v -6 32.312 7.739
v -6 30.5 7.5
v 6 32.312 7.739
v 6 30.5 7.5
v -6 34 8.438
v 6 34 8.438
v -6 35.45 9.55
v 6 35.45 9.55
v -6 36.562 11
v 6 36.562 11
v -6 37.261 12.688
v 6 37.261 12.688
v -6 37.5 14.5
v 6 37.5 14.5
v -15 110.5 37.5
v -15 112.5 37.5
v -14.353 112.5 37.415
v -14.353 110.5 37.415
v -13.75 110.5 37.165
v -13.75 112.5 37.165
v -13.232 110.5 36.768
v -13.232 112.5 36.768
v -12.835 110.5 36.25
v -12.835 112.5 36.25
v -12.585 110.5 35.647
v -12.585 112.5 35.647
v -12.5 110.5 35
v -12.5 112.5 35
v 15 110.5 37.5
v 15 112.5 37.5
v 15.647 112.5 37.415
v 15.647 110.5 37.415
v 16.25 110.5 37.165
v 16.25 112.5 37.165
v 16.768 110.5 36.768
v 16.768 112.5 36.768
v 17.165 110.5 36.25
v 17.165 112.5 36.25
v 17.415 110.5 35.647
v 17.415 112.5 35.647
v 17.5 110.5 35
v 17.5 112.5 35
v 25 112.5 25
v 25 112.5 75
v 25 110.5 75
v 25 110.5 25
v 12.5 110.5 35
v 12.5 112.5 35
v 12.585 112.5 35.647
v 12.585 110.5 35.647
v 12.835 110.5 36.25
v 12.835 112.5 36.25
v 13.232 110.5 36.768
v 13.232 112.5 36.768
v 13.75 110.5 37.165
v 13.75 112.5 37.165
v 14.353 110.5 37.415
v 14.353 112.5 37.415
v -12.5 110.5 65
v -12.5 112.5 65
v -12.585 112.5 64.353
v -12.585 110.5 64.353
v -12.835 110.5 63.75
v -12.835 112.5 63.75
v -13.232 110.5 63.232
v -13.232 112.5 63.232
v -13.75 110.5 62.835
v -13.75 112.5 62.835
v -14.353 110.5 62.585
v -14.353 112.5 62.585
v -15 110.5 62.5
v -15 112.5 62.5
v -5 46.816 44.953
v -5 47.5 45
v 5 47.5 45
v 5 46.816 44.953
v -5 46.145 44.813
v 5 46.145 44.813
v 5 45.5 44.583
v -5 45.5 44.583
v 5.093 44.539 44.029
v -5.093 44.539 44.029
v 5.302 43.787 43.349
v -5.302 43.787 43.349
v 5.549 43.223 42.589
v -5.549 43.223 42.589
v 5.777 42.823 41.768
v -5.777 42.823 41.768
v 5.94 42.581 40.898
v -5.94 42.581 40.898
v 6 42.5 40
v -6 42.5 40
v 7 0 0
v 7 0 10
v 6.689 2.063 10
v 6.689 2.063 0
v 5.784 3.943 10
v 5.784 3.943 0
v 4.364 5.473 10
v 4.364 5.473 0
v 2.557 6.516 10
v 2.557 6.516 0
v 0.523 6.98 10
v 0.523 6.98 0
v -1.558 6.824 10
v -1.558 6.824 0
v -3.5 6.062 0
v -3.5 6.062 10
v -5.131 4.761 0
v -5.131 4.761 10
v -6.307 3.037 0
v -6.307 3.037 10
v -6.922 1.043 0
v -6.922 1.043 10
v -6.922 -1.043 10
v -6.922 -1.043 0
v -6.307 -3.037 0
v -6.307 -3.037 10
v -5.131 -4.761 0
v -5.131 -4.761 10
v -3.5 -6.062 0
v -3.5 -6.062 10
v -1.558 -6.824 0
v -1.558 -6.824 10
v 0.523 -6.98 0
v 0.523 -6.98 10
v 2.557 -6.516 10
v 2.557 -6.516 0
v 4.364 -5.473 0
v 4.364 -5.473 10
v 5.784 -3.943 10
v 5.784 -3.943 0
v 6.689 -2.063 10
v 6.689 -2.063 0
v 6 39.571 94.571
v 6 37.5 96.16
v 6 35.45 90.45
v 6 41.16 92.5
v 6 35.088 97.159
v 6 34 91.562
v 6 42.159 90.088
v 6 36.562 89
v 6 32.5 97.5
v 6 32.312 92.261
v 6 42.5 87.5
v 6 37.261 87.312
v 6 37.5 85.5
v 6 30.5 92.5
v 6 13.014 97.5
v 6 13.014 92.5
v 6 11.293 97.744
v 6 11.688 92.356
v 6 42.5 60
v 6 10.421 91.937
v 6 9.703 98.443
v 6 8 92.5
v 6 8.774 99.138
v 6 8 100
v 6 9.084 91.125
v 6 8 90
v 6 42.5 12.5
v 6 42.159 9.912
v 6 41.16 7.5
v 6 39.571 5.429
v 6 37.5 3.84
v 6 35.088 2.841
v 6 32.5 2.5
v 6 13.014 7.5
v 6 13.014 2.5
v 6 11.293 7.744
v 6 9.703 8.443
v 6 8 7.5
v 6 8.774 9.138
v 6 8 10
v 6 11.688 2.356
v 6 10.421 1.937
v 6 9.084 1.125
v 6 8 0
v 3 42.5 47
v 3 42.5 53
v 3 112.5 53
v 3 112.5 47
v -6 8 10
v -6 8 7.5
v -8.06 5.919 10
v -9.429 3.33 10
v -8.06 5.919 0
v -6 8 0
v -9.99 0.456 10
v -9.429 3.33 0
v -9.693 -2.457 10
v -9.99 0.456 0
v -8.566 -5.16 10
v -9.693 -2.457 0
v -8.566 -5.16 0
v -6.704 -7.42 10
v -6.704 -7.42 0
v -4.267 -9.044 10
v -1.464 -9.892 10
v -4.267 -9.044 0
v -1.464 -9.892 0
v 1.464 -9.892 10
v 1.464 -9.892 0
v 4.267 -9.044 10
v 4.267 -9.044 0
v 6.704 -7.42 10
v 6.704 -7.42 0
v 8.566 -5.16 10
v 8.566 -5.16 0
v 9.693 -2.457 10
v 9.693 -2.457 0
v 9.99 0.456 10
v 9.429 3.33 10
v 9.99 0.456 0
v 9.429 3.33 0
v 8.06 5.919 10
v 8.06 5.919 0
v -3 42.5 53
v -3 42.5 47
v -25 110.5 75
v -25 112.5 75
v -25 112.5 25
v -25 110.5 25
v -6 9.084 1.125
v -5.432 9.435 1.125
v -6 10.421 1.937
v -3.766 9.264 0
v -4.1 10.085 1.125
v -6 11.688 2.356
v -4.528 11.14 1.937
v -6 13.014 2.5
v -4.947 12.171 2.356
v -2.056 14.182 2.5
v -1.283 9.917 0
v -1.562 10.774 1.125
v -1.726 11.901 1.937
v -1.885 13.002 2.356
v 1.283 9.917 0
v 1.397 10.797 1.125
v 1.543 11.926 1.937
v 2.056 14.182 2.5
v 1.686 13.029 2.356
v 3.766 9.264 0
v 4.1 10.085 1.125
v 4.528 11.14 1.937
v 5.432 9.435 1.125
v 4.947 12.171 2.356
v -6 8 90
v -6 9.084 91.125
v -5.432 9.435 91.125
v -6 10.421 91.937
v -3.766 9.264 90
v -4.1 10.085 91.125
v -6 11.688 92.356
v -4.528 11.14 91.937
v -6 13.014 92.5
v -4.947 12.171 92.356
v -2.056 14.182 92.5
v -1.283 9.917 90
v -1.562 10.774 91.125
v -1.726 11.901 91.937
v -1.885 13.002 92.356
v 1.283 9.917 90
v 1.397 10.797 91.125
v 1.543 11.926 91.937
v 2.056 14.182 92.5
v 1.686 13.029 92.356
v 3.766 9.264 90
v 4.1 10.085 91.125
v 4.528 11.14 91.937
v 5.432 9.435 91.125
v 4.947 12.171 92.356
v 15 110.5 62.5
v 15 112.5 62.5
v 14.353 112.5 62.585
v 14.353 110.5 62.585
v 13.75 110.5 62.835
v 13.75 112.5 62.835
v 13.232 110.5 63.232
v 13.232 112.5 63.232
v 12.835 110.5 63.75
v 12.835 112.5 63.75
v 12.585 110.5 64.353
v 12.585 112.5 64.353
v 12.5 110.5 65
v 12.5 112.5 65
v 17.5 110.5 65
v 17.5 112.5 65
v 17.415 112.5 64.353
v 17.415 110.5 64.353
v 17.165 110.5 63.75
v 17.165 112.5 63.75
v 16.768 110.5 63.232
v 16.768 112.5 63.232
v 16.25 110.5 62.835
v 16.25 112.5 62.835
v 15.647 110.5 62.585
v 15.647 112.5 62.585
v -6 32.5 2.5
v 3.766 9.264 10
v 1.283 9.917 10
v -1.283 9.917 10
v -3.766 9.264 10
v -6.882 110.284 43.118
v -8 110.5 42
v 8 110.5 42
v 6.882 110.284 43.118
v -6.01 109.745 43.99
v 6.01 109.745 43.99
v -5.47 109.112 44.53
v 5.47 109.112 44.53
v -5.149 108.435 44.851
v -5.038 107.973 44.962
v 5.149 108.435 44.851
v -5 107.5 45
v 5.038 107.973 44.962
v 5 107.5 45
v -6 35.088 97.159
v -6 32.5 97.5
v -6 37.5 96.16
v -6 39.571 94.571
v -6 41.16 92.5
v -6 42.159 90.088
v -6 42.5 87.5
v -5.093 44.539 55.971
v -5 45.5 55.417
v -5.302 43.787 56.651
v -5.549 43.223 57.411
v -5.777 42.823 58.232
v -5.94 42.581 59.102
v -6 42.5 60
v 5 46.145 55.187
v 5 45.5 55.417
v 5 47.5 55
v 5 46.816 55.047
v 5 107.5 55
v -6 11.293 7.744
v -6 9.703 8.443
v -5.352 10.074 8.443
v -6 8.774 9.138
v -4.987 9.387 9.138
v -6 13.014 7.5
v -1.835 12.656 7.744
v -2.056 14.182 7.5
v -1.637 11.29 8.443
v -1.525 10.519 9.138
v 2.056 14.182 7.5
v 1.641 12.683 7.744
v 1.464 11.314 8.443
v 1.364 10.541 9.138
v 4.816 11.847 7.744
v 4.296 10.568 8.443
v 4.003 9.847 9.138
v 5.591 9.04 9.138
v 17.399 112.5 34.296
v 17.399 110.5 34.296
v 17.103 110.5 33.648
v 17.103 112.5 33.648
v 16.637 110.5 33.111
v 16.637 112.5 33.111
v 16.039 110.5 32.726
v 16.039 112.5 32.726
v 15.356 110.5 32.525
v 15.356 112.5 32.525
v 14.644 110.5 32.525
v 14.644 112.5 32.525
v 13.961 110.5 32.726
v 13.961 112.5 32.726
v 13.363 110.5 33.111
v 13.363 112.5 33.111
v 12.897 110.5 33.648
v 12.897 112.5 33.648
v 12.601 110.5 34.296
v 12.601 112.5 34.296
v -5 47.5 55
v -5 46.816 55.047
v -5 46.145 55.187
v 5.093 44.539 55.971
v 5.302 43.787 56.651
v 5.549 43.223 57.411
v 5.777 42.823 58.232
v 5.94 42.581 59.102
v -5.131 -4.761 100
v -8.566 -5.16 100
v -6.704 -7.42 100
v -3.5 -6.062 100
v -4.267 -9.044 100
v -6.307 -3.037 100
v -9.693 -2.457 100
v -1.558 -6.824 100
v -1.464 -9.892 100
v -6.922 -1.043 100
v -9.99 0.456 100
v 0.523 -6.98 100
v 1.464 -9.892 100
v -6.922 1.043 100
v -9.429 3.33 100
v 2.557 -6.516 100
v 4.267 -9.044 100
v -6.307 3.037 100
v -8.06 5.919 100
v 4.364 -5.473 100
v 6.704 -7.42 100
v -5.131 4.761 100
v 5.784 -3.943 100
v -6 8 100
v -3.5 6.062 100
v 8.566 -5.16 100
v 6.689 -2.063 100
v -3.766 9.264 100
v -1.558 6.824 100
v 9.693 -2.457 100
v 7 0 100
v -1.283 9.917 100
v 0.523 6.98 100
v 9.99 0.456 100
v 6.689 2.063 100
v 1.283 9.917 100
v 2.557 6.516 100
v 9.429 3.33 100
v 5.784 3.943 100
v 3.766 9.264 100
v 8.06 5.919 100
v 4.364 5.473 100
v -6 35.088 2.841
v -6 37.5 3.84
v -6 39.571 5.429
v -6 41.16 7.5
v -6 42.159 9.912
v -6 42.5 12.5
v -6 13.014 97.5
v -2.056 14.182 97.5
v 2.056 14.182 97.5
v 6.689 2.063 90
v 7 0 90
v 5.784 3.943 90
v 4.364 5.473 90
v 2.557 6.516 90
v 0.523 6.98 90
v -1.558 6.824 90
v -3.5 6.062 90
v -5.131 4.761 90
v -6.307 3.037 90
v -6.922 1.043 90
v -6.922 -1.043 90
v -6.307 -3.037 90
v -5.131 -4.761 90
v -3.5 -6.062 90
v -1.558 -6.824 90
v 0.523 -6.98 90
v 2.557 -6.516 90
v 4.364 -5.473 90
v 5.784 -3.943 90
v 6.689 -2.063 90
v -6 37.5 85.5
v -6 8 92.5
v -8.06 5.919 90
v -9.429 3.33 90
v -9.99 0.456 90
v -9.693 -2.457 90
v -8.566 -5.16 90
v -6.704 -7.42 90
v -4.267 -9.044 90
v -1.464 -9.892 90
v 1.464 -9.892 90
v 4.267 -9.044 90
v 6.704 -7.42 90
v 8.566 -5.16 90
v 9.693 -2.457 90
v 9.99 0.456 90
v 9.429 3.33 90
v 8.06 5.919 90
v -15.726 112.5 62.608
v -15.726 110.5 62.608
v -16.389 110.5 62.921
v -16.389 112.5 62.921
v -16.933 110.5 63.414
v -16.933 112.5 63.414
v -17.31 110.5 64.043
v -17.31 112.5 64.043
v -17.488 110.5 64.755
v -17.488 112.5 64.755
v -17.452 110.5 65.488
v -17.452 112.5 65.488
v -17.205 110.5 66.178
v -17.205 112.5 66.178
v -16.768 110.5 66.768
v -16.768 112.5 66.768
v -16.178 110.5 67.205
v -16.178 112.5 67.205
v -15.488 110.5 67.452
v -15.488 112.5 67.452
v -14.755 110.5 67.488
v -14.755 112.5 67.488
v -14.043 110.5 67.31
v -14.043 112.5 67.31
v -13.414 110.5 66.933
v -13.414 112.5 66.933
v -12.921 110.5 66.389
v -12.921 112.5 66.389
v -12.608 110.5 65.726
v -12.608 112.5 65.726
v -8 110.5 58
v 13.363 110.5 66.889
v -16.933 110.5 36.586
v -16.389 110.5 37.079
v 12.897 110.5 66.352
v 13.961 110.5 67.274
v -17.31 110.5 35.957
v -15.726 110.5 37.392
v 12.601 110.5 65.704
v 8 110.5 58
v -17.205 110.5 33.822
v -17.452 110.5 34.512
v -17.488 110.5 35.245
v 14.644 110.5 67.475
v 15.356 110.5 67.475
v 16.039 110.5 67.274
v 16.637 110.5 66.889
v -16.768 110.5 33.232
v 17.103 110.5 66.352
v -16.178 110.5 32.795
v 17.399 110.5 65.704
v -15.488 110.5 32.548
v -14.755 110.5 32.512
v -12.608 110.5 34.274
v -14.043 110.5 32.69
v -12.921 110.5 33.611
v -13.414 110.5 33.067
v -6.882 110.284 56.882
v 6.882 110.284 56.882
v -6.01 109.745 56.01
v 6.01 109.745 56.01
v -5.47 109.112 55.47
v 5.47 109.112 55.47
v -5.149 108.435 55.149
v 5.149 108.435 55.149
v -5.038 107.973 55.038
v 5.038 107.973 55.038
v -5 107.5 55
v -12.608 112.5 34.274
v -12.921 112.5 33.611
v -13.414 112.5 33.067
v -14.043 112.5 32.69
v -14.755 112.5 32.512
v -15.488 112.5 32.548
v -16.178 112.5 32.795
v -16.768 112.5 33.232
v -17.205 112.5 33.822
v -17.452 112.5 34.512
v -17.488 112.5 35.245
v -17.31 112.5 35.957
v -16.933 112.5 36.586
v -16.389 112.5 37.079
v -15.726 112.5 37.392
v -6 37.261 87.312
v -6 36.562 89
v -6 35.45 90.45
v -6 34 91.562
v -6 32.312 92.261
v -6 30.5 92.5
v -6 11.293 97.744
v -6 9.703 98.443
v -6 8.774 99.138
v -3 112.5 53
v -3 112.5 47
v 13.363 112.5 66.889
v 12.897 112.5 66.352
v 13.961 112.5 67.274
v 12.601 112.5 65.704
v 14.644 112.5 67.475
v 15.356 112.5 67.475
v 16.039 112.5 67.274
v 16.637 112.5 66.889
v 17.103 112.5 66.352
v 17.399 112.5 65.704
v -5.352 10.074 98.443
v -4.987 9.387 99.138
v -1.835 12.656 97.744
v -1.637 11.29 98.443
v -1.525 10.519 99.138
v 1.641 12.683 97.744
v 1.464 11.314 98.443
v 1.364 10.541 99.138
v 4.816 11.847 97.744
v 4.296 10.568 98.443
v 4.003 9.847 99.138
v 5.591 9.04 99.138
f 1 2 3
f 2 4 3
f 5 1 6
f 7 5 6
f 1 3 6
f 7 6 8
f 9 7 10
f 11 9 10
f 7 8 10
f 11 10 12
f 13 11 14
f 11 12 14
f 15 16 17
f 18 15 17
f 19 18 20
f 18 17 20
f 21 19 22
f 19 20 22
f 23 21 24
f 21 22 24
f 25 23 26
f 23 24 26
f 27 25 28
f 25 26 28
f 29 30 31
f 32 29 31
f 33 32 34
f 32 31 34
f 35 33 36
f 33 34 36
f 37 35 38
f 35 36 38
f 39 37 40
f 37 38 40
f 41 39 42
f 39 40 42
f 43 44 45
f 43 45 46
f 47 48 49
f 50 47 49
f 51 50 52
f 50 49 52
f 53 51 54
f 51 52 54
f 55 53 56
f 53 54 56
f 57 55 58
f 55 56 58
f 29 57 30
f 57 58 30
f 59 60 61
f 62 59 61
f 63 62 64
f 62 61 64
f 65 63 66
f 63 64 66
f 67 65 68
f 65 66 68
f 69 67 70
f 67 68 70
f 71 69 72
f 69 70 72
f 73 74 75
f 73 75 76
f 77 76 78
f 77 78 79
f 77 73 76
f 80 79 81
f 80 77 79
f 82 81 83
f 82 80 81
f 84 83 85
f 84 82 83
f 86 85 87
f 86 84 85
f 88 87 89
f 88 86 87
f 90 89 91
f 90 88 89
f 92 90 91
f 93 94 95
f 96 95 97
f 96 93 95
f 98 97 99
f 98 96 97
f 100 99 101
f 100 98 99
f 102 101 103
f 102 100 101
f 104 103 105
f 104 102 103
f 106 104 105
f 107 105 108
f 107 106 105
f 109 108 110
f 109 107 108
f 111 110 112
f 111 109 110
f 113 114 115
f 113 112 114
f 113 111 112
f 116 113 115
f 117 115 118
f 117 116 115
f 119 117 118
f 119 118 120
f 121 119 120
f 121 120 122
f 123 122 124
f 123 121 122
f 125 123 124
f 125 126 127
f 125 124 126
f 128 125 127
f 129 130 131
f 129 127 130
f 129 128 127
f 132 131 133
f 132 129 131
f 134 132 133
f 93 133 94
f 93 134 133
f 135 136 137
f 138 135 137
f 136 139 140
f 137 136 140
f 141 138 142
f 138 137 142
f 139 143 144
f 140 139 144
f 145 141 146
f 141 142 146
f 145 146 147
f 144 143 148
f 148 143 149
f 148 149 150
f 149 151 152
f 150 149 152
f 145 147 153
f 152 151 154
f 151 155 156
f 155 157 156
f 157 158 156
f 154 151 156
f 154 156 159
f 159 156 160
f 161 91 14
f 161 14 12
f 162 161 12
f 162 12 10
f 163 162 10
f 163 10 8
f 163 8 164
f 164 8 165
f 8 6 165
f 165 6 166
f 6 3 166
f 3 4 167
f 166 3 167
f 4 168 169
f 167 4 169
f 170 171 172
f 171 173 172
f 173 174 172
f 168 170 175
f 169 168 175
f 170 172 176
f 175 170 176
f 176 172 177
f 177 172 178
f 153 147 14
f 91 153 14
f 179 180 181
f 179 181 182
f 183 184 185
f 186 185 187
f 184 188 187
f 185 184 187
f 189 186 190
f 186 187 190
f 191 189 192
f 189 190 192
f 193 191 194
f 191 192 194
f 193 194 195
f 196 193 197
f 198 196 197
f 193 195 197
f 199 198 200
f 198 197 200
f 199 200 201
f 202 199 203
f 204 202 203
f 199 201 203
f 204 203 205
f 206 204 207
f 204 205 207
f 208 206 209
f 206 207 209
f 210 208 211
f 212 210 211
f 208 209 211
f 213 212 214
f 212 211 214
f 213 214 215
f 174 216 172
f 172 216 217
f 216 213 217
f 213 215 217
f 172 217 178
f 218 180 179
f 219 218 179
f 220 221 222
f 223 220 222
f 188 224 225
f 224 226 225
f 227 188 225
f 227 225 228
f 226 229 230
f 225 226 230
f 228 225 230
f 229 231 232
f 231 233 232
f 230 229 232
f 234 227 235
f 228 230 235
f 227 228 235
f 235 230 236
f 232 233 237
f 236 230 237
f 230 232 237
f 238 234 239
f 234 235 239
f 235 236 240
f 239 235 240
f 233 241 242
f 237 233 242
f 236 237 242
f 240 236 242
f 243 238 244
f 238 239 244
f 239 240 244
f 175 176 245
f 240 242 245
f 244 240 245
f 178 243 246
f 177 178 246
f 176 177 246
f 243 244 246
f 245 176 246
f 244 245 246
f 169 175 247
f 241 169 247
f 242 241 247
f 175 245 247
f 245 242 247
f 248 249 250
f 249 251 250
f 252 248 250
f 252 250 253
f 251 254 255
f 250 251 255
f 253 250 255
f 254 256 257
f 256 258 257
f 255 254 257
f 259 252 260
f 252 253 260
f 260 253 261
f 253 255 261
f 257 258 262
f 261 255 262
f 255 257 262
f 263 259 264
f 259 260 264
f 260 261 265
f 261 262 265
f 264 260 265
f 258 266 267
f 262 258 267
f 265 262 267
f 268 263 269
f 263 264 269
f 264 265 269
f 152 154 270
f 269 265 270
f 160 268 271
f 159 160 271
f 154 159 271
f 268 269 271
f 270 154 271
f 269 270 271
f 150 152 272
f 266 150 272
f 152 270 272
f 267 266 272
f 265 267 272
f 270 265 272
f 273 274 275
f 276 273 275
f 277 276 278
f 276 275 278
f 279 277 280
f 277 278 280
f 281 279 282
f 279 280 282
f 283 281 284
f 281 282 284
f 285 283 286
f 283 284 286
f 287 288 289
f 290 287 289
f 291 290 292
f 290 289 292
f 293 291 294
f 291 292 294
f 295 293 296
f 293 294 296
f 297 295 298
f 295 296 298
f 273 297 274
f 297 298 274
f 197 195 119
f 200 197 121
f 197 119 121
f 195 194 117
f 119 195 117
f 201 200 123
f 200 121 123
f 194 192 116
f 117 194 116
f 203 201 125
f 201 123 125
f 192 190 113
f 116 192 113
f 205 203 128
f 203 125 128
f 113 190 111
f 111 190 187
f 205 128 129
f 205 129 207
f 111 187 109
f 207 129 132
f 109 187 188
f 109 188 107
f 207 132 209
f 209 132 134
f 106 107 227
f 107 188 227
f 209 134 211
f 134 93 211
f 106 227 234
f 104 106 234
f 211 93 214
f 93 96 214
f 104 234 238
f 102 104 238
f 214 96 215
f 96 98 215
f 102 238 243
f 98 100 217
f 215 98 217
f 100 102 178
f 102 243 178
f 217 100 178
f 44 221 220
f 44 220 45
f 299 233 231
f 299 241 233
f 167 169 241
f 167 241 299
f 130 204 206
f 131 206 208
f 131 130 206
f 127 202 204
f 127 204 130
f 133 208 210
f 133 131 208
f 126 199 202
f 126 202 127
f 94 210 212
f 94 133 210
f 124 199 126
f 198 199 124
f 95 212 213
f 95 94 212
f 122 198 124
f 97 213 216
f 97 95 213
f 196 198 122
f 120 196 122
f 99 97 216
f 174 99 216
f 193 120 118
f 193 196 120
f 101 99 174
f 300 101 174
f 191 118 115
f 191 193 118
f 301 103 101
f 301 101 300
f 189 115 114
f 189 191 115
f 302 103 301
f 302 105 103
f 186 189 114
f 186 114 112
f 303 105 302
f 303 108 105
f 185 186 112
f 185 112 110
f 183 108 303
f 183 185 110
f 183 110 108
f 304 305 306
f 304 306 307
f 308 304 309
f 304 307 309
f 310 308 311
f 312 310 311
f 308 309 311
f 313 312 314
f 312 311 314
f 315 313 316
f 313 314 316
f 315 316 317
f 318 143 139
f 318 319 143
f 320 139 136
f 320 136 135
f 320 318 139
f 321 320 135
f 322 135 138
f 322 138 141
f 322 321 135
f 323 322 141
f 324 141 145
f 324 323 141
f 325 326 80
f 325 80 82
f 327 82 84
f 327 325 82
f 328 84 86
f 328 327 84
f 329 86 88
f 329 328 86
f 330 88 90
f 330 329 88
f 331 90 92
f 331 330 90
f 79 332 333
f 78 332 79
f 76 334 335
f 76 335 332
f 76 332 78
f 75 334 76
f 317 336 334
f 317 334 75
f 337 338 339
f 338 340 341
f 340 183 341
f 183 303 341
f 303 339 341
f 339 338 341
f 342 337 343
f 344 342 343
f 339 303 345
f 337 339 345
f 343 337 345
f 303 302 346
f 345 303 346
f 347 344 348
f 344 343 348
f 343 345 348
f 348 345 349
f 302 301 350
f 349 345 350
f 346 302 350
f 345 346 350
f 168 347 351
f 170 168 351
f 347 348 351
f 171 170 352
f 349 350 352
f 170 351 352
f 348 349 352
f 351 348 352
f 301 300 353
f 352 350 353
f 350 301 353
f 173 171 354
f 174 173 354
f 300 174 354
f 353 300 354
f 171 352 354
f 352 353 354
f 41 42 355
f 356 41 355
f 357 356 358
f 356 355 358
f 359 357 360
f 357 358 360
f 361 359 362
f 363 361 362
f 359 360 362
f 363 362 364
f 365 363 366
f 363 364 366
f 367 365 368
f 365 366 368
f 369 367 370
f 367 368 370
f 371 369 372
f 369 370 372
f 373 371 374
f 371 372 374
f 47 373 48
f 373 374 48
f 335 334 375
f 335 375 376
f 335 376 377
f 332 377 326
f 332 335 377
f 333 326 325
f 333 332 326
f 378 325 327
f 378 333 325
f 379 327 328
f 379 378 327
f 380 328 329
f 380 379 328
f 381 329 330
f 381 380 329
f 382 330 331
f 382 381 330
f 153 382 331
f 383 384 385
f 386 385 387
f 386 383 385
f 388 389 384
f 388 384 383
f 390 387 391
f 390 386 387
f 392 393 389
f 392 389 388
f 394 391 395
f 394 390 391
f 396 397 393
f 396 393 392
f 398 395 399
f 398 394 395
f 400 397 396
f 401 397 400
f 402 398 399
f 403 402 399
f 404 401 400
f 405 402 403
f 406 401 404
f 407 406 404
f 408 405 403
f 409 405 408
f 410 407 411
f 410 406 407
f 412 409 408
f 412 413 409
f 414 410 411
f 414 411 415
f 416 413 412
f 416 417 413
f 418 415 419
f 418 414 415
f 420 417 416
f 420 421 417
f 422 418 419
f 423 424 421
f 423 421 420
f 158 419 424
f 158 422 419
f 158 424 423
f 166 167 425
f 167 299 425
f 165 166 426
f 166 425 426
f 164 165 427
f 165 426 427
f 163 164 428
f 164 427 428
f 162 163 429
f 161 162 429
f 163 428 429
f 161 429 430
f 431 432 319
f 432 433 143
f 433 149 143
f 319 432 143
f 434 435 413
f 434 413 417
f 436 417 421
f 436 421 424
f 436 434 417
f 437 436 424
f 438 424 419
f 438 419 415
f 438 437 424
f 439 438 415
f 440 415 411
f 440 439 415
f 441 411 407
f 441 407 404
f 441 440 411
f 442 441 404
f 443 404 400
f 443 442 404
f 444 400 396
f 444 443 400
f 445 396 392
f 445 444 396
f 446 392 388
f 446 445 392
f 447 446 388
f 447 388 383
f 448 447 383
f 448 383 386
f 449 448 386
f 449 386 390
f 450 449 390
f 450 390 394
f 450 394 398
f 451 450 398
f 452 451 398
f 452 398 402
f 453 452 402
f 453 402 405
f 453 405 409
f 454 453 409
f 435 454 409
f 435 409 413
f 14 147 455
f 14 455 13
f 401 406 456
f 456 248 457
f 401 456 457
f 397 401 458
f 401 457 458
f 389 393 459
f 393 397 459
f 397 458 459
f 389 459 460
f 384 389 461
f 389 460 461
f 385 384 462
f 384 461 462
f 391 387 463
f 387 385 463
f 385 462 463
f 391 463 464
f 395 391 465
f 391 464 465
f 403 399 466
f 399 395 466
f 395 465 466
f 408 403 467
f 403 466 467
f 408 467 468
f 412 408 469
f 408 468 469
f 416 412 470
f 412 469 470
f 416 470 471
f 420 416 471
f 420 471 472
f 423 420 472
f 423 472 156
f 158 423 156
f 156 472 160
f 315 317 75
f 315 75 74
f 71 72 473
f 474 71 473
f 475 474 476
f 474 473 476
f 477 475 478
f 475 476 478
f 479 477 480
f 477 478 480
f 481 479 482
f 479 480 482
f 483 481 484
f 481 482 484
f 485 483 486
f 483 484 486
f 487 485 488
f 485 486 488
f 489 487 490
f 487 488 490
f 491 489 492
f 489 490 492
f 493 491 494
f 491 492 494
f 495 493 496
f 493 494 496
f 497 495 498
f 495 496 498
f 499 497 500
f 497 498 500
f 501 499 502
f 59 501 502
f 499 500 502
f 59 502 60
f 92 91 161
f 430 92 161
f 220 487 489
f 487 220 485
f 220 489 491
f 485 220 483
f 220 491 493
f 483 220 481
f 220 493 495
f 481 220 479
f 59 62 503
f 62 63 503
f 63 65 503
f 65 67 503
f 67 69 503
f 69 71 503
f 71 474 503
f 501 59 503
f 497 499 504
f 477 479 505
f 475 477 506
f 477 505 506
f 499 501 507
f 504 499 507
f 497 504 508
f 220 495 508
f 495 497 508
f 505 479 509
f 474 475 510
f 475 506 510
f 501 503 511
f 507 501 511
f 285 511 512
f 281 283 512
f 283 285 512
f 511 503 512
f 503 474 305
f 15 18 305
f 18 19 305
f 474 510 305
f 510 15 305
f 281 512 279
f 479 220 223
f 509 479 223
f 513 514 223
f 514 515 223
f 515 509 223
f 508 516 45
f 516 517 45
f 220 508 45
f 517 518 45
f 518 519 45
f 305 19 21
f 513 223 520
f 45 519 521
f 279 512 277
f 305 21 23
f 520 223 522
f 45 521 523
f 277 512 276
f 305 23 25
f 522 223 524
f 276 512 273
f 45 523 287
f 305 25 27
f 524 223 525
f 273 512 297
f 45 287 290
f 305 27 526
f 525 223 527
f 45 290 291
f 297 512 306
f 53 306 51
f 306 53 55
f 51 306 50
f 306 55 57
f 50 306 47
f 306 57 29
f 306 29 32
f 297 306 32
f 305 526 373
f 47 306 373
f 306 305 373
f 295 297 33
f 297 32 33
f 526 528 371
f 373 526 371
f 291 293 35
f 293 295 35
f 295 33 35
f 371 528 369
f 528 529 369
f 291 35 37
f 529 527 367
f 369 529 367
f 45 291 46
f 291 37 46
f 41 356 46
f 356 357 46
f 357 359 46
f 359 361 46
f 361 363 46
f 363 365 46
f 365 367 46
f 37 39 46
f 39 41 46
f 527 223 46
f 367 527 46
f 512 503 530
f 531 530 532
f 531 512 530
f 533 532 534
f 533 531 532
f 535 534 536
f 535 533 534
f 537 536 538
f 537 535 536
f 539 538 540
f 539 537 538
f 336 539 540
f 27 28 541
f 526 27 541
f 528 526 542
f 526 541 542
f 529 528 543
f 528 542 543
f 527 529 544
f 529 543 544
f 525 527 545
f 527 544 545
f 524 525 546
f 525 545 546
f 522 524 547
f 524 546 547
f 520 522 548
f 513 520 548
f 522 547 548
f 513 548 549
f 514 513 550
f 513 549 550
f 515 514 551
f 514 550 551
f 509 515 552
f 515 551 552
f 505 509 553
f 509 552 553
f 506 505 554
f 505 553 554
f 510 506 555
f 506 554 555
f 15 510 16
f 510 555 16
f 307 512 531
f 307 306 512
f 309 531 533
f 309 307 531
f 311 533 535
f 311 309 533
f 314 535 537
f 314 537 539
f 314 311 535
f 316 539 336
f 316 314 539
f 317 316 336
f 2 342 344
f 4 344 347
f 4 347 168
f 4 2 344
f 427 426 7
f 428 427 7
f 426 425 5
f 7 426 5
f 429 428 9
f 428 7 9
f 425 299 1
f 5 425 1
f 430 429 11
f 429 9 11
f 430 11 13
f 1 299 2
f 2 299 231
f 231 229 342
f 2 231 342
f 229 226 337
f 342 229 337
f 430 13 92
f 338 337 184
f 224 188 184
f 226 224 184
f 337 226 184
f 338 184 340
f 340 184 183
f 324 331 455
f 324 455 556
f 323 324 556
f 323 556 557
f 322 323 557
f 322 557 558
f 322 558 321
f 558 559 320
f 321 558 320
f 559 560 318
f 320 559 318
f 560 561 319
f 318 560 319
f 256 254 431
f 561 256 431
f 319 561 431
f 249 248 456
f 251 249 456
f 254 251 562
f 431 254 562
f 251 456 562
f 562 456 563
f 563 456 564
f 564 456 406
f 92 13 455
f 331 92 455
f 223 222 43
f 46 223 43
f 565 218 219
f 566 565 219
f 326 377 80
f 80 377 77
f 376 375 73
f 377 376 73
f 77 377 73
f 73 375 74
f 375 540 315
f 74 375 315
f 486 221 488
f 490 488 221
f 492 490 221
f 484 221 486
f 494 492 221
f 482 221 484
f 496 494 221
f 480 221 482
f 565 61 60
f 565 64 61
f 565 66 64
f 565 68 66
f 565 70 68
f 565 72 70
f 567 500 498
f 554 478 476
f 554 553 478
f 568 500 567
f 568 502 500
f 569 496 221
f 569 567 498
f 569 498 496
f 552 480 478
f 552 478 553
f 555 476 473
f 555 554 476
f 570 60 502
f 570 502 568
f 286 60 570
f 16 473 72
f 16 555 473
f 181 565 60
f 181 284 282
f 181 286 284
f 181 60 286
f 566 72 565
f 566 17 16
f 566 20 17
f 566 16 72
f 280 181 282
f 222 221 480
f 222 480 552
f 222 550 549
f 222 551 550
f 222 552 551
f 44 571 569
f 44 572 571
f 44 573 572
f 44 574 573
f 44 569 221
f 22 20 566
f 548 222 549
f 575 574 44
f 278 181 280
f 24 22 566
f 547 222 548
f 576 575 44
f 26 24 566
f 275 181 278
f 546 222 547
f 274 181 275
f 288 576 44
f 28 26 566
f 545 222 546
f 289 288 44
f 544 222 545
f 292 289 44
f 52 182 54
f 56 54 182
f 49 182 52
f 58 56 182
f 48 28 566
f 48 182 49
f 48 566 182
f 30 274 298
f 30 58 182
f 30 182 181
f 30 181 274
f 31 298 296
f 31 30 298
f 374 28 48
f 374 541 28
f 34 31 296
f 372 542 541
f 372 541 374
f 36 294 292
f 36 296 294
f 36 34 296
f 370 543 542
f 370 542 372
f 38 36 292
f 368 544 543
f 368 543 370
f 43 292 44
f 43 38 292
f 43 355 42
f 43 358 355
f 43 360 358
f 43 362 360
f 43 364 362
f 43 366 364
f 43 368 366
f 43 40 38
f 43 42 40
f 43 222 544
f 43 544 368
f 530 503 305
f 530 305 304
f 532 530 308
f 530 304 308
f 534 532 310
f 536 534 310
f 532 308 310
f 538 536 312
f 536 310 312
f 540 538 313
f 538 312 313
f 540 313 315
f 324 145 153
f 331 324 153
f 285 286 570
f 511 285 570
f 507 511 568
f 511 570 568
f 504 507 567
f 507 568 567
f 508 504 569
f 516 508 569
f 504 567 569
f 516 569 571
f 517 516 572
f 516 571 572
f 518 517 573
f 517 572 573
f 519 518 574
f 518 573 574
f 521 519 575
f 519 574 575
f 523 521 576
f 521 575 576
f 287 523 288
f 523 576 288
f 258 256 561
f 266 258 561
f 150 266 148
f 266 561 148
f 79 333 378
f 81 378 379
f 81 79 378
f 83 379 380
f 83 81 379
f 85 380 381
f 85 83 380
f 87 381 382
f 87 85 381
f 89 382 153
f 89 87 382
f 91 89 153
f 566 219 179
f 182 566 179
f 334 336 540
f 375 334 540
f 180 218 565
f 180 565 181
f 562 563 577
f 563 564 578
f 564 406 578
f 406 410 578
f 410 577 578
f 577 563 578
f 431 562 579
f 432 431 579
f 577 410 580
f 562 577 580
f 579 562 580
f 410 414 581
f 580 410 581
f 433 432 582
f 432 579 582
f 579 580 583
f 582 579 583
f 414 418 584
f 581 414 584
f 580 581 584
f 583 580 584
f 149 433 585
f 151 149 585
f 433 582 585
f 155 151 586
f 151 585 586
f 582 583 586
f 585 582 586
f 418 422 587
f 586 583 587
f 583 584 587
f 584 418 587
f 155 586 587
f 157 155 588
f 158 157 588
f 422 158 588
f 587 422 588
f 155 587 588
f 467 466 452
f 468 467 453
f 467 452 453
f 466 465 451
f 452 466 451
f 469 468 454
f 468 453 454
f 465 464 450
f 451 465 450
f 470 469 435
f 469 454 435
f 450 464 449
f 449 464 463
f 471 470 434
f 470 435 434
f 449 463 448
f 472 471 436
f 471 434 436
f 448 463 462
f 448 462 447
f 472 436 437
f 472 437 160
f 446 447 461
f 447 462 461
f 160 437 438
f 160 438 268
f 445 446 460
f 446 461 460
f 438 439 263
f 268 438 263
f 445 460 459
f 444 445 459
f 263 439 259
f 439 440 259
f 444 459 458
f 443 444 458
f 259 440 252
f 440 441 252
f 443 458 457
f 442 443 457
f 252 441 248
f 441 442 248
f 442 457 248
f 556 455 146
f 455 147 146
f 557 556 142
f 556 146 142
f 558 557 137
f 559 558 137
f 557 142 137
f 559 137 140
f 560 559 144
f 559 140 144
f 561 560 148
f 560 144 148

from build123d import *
from OCP.BRepFilletAPI import BRepFilletAPI_MakeFillet

# Parameters (mm, degrees)
SKETCH1_R               = 10
SKETCH1_R_2             = 7
BOSS_EXTRUDE1_DEPTH     = 100
CUT_EXTRUDE1_DEPTH      = 101.995049384
CUT_EXTRUDE1_DEPTH_BACK = 101.995049384
SKETCH2_W               = 80
SKETCH2_H               = 53.3052099
SKETCH3_W               = 12
SKETCH3_H               = 5
BOSS_EXTRUDE2_DEPTH     = 37
CUT_EXTRUDE2_DEPTH      = 105
SKETCH5_W               = 95
SKETCH5_H               = 5
BOSS_EXTRUDE3_DEPTH     = 12
FILLET1_R1              = 10
FILLET1_R2              = 7
SKETCH6_W               = 10
SKETCH6_H               = 10
SKETCH6_W_2             = 6
SKETCH6_H_2             = 6
BOSS_EXTRUDE4_DEPTH     = 70
FILLET2_R               = 5
SKETCH7_W               = 50
SKETCH7_H               = 50
SKETCH7_W_2             = 10
SKETCH7_H_2             = 10
BOSS_EXTRUDE5_DEPTH     = 2
FILLET3_R               = 3
CUT_EXTRUDE3_DEPTH      = 161.097626528


with BuildPart() as part:
    # Sketch1 → Boss-Extrude1 (new body)
    with BuildSketch(Plane.XY):
        Circle(SKETCH1_R)
        Circle(SKETCH1_R_2, mode=Mode.SUBTRACT)
    extrude(amount=BOSS_EXTRUDE1_DEPTH)

    # Sketch2 → Cut-Extrude1 (cut, two sides: drawn at the far end of the back side and taken through both)
    with BuildSketch(Plane(origin=(0, 0, 0), x_dir=(0, 0, -1), z_dir=(1, 0, 0)).offset(-CUT_EXTRUDE1_DEPTH_BACK)):
        with Locations((-50, -4.566645708)):
            Rectangle(SKETCH2_W, SKETCH2_H)
    extrude(amount=CUT_EXTRUDE1_DEPTH + CUT_EXTRUDE1_DEPTH_BACK, mode=Mode.SUBTRACT)


with BuildPart() as cut_extrude1_piece_1:
    # of the separate pieces the step leaves, piece 1, a body of its own (cut_extrude1_pieces)
    add(part.part.solids().sort_by_distance((10, 0, 0))[0])



with BuildPart() as cut_extrude1_piece_2:
    # of the separate pieces the step leaves, piece 2, a body of its own (cut_extrude1_pieces)
    add(part.part.solids().sort_by_distance((10, 0, 90))[0])


with BuildPart() as cut_extrude1_piece_1_1:
    add(cut_extrude1_piece_1.part)

    add(cut_extrude1_piece_2.part)  # Boss-Extrude2 merges Cut-Extrude1 piece 2
    # Sketch3 → Boss-Extrude2 (add)
    with BuildSketch(Plane(origin=(0, 37.5, 0), x_dir=(1, 0, 0), z_dir=(0, 1, 0))):
        with Locations((0, -95)):
            Rectangle(SKETCH3_W, SKETCH3_H)
        with Locations((0, -5)):
            Rectangle(SKETCH3_W, SKETCH3_H)
    extrude(amount=-BOSS_EXTRUDE2_DEPTH)

    # Sketch4 → Cut-Extrude2 (cut)
    with BuildSketch(Plane.XY.offset(97.5)):
        with BuildLine():
            Line((-6, 0.5), (6, 0.5))
            Line((6, 0.5), (6, 3.605551275))
            ThreePointArc((6, 3.605551275), (0, 7), (-6, 3.605551275))
            Line((-6, 3.605551275), (-6, 0.5))
        make_face()
    extrude(amount=-CUT_EXTRUDE2_DEPTH, mode=Mode.SUBTRACT)

    # Sketch5 → Boss-Extrude3 (add)
    with BuildSketch(Plane(origin=(6, 0, 0), x_dir=(0, 0, -1), z_dir=(1, 0, 0))):
        with Locations((-50, 40)):
            Rectangle(SKETCH5_W, SKETCH5_H)
    extrude(amount=-BOSS_EXTRUDE3_DEPTH)

    # Fillet1: one fillet with a radius per group of edges: ONE call of the kernel's fillet builder (fillet() takes one radius for all edges)
    fillet1_edges_1 = [cut_extrude1_piece_1_1.edges().sort_by_distance(p)[0] for p in [
        (0, 42.5, 97.5),
        (0, 42.5, 2.5),
    ]]
    fillet1_edges_2 = [cut_extrude1_piece_1_1.edges().sort_by_distance(p)[0] for p in [
        (0, 37.5, 92.5),
        (0, 37.5, 7.5),
    ]]
    fillet1 = BRepFilletAPI_MakeFillet(cut_extrude1_piece_1_1.part.solid().wrapped)
    for e in fillet1_edges_1:
        fillet1.Add(FILLET1_R1, e.wrapped)
    for e in fillet1_edges_2:
        fillet1.Add(FILLET1_R2, e.wrapped)
    add(Compound.cast(fillet1.Shape()), mode=Mode.REPLACE)

    # Sketch6 → Boss-Extrude4 (add)
    with BuildSketch(Plane(origin=(0, 42.5, 0), x_dir=(1, 0, 0), z_dir=(0, 1, 0))):
        with Locations((0, -50)):
            Rectangle(SKETCH6_W, SKETCH6_H)
        with Locations((0, -50)):
            Rectangle(SKETCH6_W_2, SKETCH6_H_2, mode=Mode.SUBTRACT)
    extrude(amount=BOSS_EXTRUDE4_DEPTH)

    # Fillet2
    # the kernel refuses this fillet: 5 mm, written as the material it adds along each edge
    with BuildSketch(Plane(origin=(0, 0, 97.5), x_dir=(-0.9879298131416905, -0.15490217656903477, 0), z_dir=(0.15490217656903477, -0.9879298131416905, 0))) as fillet2_piece_1_section:
        with BuildLine():
            CenterArc((14.330127019, -5), FILLET2_R, 90, 60)
            Line((10, -2.5), (9.91339746, -2.45))
            ThreePointArc((9.91339746, -2.45), (9.9, -1.25), (9.9, 0))
            Line((9.9, 0), (10, 0.1))
            Line((10, 0.1), (14.330127019, 0.1))
            Line((14.330127019, 0.1), (14.330127019, 0))
        make_face()
    fillet2_piece_1 = revolve(axis=Axis((0, 0, 97.5), (0, 0, -1)), revolution_arc=197.822245722, mode=Mode.PRIVATE)
    fillet2_piece_1 = split(fillet2_piece_1, bisect_by=Plane(origin=(6, 10.469703394, 98.151254793), z_dir=(-1, 0, 0)), keep=Keep.TOP, mode=Mode.PRIVATE)
    fillet2_piece_1 = split(fillet2_piece_1, bisect_by=Plane(origin=(-6, 10.469703394, 98.151254793), z_dir=(1, 0, 0)), keep=Keep.TOP, mode=Mode.PRIVATE)
    add(fillet2_piece_1)
    with BuildSketch(Plane(origin=(0, 0, 92.5), x_dir=(-0.9879298131416903, -0.15490217656903651, 0), z_dir=(0.15490217656903651, -0.9879298131416903, 0))) as fillet2_piece_2_section:
        with BuildLine():
            CenterArc((14.330127019, 5), FILLET2_R, 210, 60)
            Line((14.330127019, 0), (14.330127019, -0.1))
            Line((14.330127019, -0.1), (10, -0.1))
            Line((10, -0.1), (9.9, 0))
            ThreePointArc((9.9, 0), (9.9, 1.25), (9.91339746, 2.45))
            Line((9.91339746, 2.45), (10, 2.5))
        make_face()
    fillet2_piece_2 = revolve(axis=Axis((0, 0, 92.5), (0, 0, -1)), revolution_arc=197.822245722, mode=Mode.PRIVATE)
    fillet2_piece_2 = split(fillet2_piece_2, bisect_by=Plane(origin=(6, 10.469703394, 91.848745207), z_dir=(-1, 0, 0)), keep=Keep.TOP, mode=Mode.PRIVATE)
    fillet2_piece_2 = split(fillet2_piece_2, bisect_by=Plane(origin=(-6, 10.469703394, 91.848745207), z_dir=(1, 0, 0)), keep=Keep.TOP, mode=Mode.PRIVATE)
    add(fillet2_piece_2)
    with BuildSketch(Plane(origin=(0, 0, 2.5), x_dir=(-0.98792981314169, -0.1549021765690374, 0), z_dir=(0.1549021765690374, -0.98792981314169, 0))) as fillet2_piece_3_section:
        with BuildLine():
            CenterArc((14.330127019, 5), FILLET2_R, 210, 60)
            Line((14.330127019, 0), (14.330127019, -0.1))
            Line((14.330127019, -0.1), (10, -0.1))
            Line((10, -0.1), (9.9, 0))
            ThreePointArc((9.9, 0), (9.9, 1.25), (9.91339746, 2.45))
            Line((9.91339746, 2.45), (10, 2.5))
        make_face()
    fillet2_piece_3 = revolve(axis=Axis((0, 0, 2.5), (0, 0, -1)), revolution_arc=197.822245722, mode=Mode.PRIVATE)
    fillet2_piece_3 = split(fillet2_piece_3, bisect_by=Plane(origin=(6, 10.469703394, 1.848745207), z_dir=(-1, 0, 0)), keep=Keep.TOP, mode=Mode.PRIVATE)
    fillet2_piece_3 = split(fillet2_piece_3, bisect_by=Plane(origin=(-6, 10.469703394, 1.848745207), z_dir=(1, 0, 0)), keep=Keep.TOP, mode=Mode.PRIVATE)
    add(fillet2_piece_3)
    with BuildSketch(Plane(origin=(0, 0, 7.5), x_dir=(-0.9879298131416905, -0.15490217656903565, 0), z_dir=(0.15490217656903565, -0.9879298131416905, 0))) as fillet2_piece_4_section:
        with BuildLine():
            CenterArc((14.330127019, -5), FILLET2_R, 90, 60)
            Line((10, -2.5), (9.91339746, -2.45))
            ThreePointArc((9.91339746, -2.45), (9.9, -1.25), (9.9, 0))
            Line((9.9, 0), (10, 0.1))
            Line((10, 0.1), (14.330127019, 0.1))
            Line((14.330127019, 0.1), (14.330127019, 0))
        make_face()
    fillet2_piece_4 = revolve(axis=Axis((0, 0, 7.5), (0, 0, -1)), revolution_arc=197.822245722, mode=Mode.PRIVATE)
    fillet2_piece_4 = split(fillet2_piece_4, bisect_by=Plane(origin=(6, 10.469703394, 8.151254793), z_dir=(-1, 0, 0)), keep=Keep.TOP, mode=Mode.PRIVATE)
    fillet2_piece_4 = split(fillet2_piece_4, bisect_by=Plane(origin=(-6, 10.469703394, 8.151254793), z_dir=(1, 0, 0)), keep=Keep.TOP, mode=Mode.PRIVATE)
    add(fillet2_piece_4)
    with BuildSketch(Plane(origin=(5, 42.5, 45), x_dir=(1, 0, 0), z_dir=(0, 0, 1)), Plane(origin=(-5, 42.5, 55), x_dir=(-1, 0, 0), z_dir=(0, 0, -1))) as fillet2_piece_5:
        with BuildLine():
            CenterArc((5, 3), FILLET2_R, 180, 36.869897646)
            Line((0, 3), (-0.1, 3))
            Line((-0.1, 3), (-0.1, 0))
            Line((-0.1, 0), (0, -0.1))
            ThreePointArc((0, -0.1), (0.5, -0.1), (0.92, -0.06))
            Line((0.92, -0.06), (1, 0))
        make_face()
    extrude(amount=10)
    with BuildSketch(Plane(origin=(5, 42.5, 55), x_dir=(0, 0, 1), z_dir=(-1, 0, 0)), Plane(origin=(-5, 42.5, 45), x_dir=(0, 0, -1), z_dir=(1, 0, 0))) as fillet2_piece_6:
        with BuildLine():
            CenterArc((FILLET2_R, FILLET2_R), FILLET2_R, 180, 90)
            Line((0, FILLET2_R), (-FILLET2_R * 0.02, FILLET2_R))
            Line((-FILLET2_R * 0.02, FILLET2_R), (-FILLET2_R * 0.02, -FILLET2_R * 0.02))
            Line((-FILLET2_R * 0.02, -FILLET2_R * 0.02), (FILLET2_R, -FILLET2_R * 0.02))
            Line((FILLET2_R, -FILLET2_R * 0.02), (FILLET2_R, 0))
        make_face()
    extrude(amount=10)
    with BuildSketch(Plane(origin=(5, 42.5, 37.5), x_dir=(1, 0, 0), z_dir=(0, 0, 1))) as fillet2_piece_7a_section:
        with BuildLine():
            CenterArc((5, 3), FILLET2_R, 180, 36.869897646)
            Line((0, 3), (-0.1, 3))
            Line((-0.1, 3), (-0.1, 0))
            Line((-0.1, 0), (0, -0.1))
            ThreePointArc((0, -0.1), (0.5, -0.1), (0.92, -0.06))
            Line((0.92, -0.06), (1, 0))
        make_face()
    fillet2_piece_7a = extrude(amount=17.5, mode=Mode.PRIVATE)
    fillet2_piece_7a = split(fillet2_piece_7a, bisect_by=Plane(origin=(5.226188398, 43.349672813, 45), z_dir=(0, 0, -1)), keep=Keep.TOP, mode=Mode.PRIVATE)
    with BuildSketch(Plane(origin=(-5, 42.5, 45), x_dir=(0, 0, -1), z_dir=(1, 0, 0))) as fillet2_piece_7b_section:
        with BuildLine():
            CenterArc((FILLET2_R, FILLET2_R), FILLET2_R, 180, 90)
            Line((0, FILLET2_R), (-FILLET2_R * 0.02, FILLET2_R))
            Line((-FILLET2_R * 0.02, FILLET2_R), (-FILLET2_R * 0.02, -FILLET2_R * 0.02))
            Line((-FILLET2_R * 0.02, -FILLET2_R * 0.02), (FILLET2_R, -FILLET2_R * 0.02))
            Line((FILLET2_R, -FILLET2_R * 0.02), (FILLET2_R, 0))
        make_face()
    fillet2_piece_7b = extrude(amount=22.5, mode=Mode.PRIVATE)
    fillet2_piece_7b = split(fillet2_piece_7b, bisect_by=Plane(origin=(6, 43.631975571, 43.868024429), z_dir=(-1, 0, 0)), keep=Keep.TOP, mode=Mode.PRIVATE)
    fillet2_piece_7b = split(fillet2_piece_7b, bisect_by=Plane(origin=(5, 43.631975571, 43.868024429), z_dir=(1, 0, 0)), keep=Keep.TOP, mode=Mode.PRIVATE)
    fillet2_piece_7 = fillet2_piece_7a & fillet2_piece_7b
    add(fillet2_piece_7)
    with BuildSketch(Plane(origin=(17.5, 42.5, 55), x_dir=(0, 0, 1), z_dir=(-1, 0, 0))) as fillet2_piece_8a_section:
        with BuildLine():
            CenterArc((FILLET2_R, FILLET2_R), FILLET2_R, 180, 90)
            Line((0, FILLET2_R), (-FILLET2_R * 0.02, FILLET2_R))
            Line((-FILLET2_R * 0.02, FILLET2_R), (-FILLET2_R * 0.02, -FILLET2_R * 0.02))
            Line((-FILLET2_R * 0.02, -FILLET2_R * 0.02), (FILLET2_R, -FILLET2_R * 0.02))
            Line((FILLET2_R, -FILLET2_R * 0.02), (FILLET2_R, 0))
        make_face()
    fillet2_piece_8a = extrude(amount=22.5, mode=Mode.PRIVATE)
    fillet2_piece_8a = split(fillet2_piece_8a, bisect_by=Plane(origin=(6, 43.631975571, 56.131975571), z_dir=(-1, 0, 0)), keep=Keep.TOP, mode=Mode.PRIVATE)
    fillet2_piece_8a = split(fillet2_piece_8a, bisect_by=Plane(origin=(5, 43.631975571, 56.131975571), z_dir=(1, 0, 0)), keep=Keep.TOP, mode=Mode.PRIVATE)
    with BuildSketch(Plane(origin=(5, 42.5, 45), x_dir=(1, 0, 0), z_dir=(0, 0, 1))) as fillet2_piece_8b_section:
        with BuildLine():
            CenterArc((5, 3), FILLET2_R, 180, 36.869897646)
            Line((0, 3), (-0.1, 3))
            Line((-0.1, 3), (-0.1, 0))
            Line((-0.1, 0), (0, -0.1))
            ThreePointArc((0, -0.1), (0.5, -0.1), (0.92, -0.06))
            Line((0.92, -0.06), (1, 0))
        make_face()
    fillet2_piece_8b = extrude(amount=17.5, mode=Mode.PRIVATE)
    fillet2_piece_8b = split(fillet2_piece_8b, bisect_by=Plane(origin=(5.226188398, 43.349672813, 55), z_dir=(0, 0, 1)), keep=Keep.TOP, mode=Mode.PRIVATE)
    fillet2_piece_8 = fillet2_piece_8a & fillet2_piece_8b
    add(fillet2_piece_8)
    with BuildSketch(Plane(origin=(-5, 42.5, 62.5), x_dir=(-1, 0, 0), z_dir=(0, 0, -1))) as fillet2_piece_9a_section:
        with BuildLine():
            CenterArc((5, 3), FILLET2_R, 180, 36.869897646)
            Line((0, 3), (-0.1, 3))
            Line((-0.1, 3), (-0.1, 0))
            Line((-0.1, 0), (0, -0.1))
            ThreePointArc((0, -0.1), (0.5, -0.1), (0.92, -0.06))
            Line((0.92, -0.06), (1, 0))
        make_face()
    fillet2_piece_9a = extrude(amount=17.5, mode=Mode.PRIVATE)
    fillet2_piece_9a = split(fillet2_piece_9a, bisect_by=Plane(origin=(-5.226188398, 43.349672813, 55), z_dir=(0, 0, 1)), keep=Keep.TOP, mode=Mode.PRIVATE)
    with BuildSketch(Plane(origin=(5, 42.5, 55), x_dir=(0, 0, 1), z_dir=(-1, 0, 0))) as fillet2_piece_9b_section:
        with BuildLine():
            CenterArc((FILLET2_R, FILLET2_R), FILLET2_R, 180, 90)
            Line((0, FILLET2_R), (-FILLET2_R * 0.02, FILLET2_R))
            Line((-FILLET2_R * 0.02, FILLET2_R), (-FILLET2_R * 0.02, -FILLET2_R * 0.02))
            Line((-FILLET2_R * 0.02, -FILLET2_R * 0.02), (FILLET2_R, -FILLET2_R * 0.02))
            Line((FILLET2_R, -FILLET2_R * 0.02), (FILLET2_R, 0))
        make_face()
    fillet2_piece_9b = extrude(amount=22.5, mode=Mode.PRIVATE)
    fillet2_piece_9b = split(fillet2_piece_9b, bisect_by=Plane(origin=(-6, 43.631975571, 56.131975571), z_dir=(1, 0, 0)), keep=Keep.TOP, mode=Mode.PRIVATE)
    fillet2_piece_9b = split(fillet2_piece_9b, bisect_by=Plane(origin=(-5, 43.631975571, 56.131975571), z_dir=(-1, 0, 0)), keep=Keep.TOP, mode=Mode.PRIVATE)
    fillet2_piece_9 = fillet2_piece_9a & fillet2_piece_9b
    add(fillet2_piece_9)
    with BuildSketch(Plane(origin=(-5, 42.5, 55), x_dir=(-1, 0, 0), z_dir=(0, 0, -1))) as fillet2_piece_10a_section:
        with BuildLine():
            CenterArc((5, 3), FILLET2_R, 180, 36.869897646)
            Line((0, 3), (-0.1, 3))
            Line((-0.1, 3), (-0.1, 0))
            Line((-0.1, 0), (0, -0.1))
            ThreePointArc((0, -0.1), (0.5, -0.1), (0.92, -0.06))
            Line((0.92, -0.06), (1, 0))
        make_face()
    fillet2_piece_10a = extrude(amount=17.5, mode=Mode.PRIVATE)
    fillet2_piece_10a = split(fillet2_piece_10a, bisect_by=Plane(origin=(-5.226188398, 43.349672813, 45), z_dir=(0, 0, -1)), keep=Keep.TOP, mode=Mode.PRIVATE)
    with BuildSketch(Plane(origin=(-17.5, 42.5, 45), x_dir=(0, 0, -1), z_dir=(1, 0, 0))) as fillet2_piece_10b_section:
        with BuildLine():
            CenterArc((FILLET2_R, FILLET2_R), FILLET2_R, 180, 90)
            Line((0, FILLET2_R), (-FILLET2_R * 0.02, FILLET2_R))
            Line((-FILLET2_R * 0.02, FILLET2_R), (-FILLET2_R * 0.02, -FILLET2_R * 0.02))
            Line((-FILLET2_R * 0.02, -FILLET2_R * 0.02), (FILLET2_R, -FILLET2_R * 0.02))
            Line((FILLET2_R, -FILLET2_R * 0.02), (FILLET2_R, 0))
        make_face()
    fillet2_piece_10b = extrude(amount=22.5, mode=Mode.PRIVATE)
    fillet2_piece_10b = split(fillet2_piece_10b, bisect_by=Plane(origin=(-6, 43.631975571, 43.868024429), z_dir=(1, 0, 0)), keep=Keep.TOP, mode=Mode.PRIVATE)
    fillet2_piece_10b = split(fillet2_piece_10b, bisect_by=Plane(origin=(-5, 43.631975571, 43.868024429), z_dir=(-1, 0, 0)), keep=Keep.TOP, mode=Mode.PRIVATE)
    fillet2_piece_10 = fillet2_piece_10a & fillet2_piece_10b
    add(fillet2_piece_10)

    # Sketch7 → Boss-Extrude5 (add)
    with BuildSketch(Plane(origin=(0, 112.5, 0), x_dir=(1, 0, 0), z_dir=(0, 1, 0))):
        with Locations((0, -50)):
            Rectangle(SKETCH7_W, SKETCH7_H)
        with Locations((0, -50)):
            Rectangle(SKETCH7_W_2, SKETCH7_H_2, mode=Mode.SUBTRACT)
    extrude(amount=-BOSS_EXTRUDE5_DEPTH)

    # Fillet3
    fillet3_edges = [cut_extrude1_piece_1_1.edges().sort_by_distance(p)[0] for p in [
        (5, 110.5, 50),
        (0, 110.5, 45),
        (-5, 110.5, 50),
        (0, 110.5, 55),
    ]]
    fillet(fillet3_edges, radius=FILLET3_R)

    # Sketch8 → Cut-Extrude3 (cut, through all)
    with BuildSketch(Plane(origin=(0, 112.5, 0), x_dir=(1, 0, 0), z_dir=(0, 1, 0))):
        with BuildLine():
            ThreePointArc((17.5, -65), (16.767766953, -63.232233047), (15, -62.5))
            Line((15, -62.5), (15, -65))
            Line((15, -65), (12.5, -65))
            ThreePointArc((12.5, -65), (15, -67.5), (17.5, -65))
        make_face()
        with BuildLine():
            Line((15, -65), (15, -62.5))
            ThreePointArc((15, -62.5), (13.232233047, -63.232233047), (12.5, -65))
            Line((12.5, -65), (15, -65))
        make_face()
        with BuildLine():
            ThreePointArc((17.5, -35), (15, -32.5), (12.5, -35))
            Line((12.5, -35), (15, -35))
            Line((15, -35), (15, -37.5))
            ThreePointArc((15, -37.5), (16.767766953, -36.767766953), (17.5, -35))
        make_face()
        with BuildLine():
            Line((15, -35), (12.5, -35))
            ThreePointArc((12.5, -35), (13.232233047, -36.767766953), (15, -37.5))
            Line((15, -37.5), (15, -35))
        make_face()
        with BuildLine():
            ThreePointArc((-15, -37.5), (-13.232233047, -36.767766953), (-12.5, -35))
            Line((-12.5, -35), (-15, -35))
            Line((-15, -35), (-15, -37.5))
        make_face()
        with BuildLine():
            Line((-15, -35), (-12.5, -35))
            ThreePointArc((-12.5, -35), (-16.767766953, -33.232233047), (-15, -37.5))
            Line((-15, -37.5), (-15, -35))
        make_face()
        with BuildLine():
            ThreePointArc((-12.5, -65), (-13.232233047, -63.232233047), (-15, -62.5))
            Line((-15, -62.5), (-15, -65))
            Line((-15, -65), (-12.5, -65))
        make_face()
        with BuildLine():
            Line((-15, -65), (-15, -62.5))
            ThreePointArc((-15, -62.5), (-16.767766953, -66.767766953), (-12.5, -65))
            Line((-12.5, -65), (-15, -65))
        make_face()
    extrude(amount=-CUT_EXTRUDE3_DEPTH, mode=Mode.SUBTRACT)


solid = cut_extrude1_piece_1_1.part
